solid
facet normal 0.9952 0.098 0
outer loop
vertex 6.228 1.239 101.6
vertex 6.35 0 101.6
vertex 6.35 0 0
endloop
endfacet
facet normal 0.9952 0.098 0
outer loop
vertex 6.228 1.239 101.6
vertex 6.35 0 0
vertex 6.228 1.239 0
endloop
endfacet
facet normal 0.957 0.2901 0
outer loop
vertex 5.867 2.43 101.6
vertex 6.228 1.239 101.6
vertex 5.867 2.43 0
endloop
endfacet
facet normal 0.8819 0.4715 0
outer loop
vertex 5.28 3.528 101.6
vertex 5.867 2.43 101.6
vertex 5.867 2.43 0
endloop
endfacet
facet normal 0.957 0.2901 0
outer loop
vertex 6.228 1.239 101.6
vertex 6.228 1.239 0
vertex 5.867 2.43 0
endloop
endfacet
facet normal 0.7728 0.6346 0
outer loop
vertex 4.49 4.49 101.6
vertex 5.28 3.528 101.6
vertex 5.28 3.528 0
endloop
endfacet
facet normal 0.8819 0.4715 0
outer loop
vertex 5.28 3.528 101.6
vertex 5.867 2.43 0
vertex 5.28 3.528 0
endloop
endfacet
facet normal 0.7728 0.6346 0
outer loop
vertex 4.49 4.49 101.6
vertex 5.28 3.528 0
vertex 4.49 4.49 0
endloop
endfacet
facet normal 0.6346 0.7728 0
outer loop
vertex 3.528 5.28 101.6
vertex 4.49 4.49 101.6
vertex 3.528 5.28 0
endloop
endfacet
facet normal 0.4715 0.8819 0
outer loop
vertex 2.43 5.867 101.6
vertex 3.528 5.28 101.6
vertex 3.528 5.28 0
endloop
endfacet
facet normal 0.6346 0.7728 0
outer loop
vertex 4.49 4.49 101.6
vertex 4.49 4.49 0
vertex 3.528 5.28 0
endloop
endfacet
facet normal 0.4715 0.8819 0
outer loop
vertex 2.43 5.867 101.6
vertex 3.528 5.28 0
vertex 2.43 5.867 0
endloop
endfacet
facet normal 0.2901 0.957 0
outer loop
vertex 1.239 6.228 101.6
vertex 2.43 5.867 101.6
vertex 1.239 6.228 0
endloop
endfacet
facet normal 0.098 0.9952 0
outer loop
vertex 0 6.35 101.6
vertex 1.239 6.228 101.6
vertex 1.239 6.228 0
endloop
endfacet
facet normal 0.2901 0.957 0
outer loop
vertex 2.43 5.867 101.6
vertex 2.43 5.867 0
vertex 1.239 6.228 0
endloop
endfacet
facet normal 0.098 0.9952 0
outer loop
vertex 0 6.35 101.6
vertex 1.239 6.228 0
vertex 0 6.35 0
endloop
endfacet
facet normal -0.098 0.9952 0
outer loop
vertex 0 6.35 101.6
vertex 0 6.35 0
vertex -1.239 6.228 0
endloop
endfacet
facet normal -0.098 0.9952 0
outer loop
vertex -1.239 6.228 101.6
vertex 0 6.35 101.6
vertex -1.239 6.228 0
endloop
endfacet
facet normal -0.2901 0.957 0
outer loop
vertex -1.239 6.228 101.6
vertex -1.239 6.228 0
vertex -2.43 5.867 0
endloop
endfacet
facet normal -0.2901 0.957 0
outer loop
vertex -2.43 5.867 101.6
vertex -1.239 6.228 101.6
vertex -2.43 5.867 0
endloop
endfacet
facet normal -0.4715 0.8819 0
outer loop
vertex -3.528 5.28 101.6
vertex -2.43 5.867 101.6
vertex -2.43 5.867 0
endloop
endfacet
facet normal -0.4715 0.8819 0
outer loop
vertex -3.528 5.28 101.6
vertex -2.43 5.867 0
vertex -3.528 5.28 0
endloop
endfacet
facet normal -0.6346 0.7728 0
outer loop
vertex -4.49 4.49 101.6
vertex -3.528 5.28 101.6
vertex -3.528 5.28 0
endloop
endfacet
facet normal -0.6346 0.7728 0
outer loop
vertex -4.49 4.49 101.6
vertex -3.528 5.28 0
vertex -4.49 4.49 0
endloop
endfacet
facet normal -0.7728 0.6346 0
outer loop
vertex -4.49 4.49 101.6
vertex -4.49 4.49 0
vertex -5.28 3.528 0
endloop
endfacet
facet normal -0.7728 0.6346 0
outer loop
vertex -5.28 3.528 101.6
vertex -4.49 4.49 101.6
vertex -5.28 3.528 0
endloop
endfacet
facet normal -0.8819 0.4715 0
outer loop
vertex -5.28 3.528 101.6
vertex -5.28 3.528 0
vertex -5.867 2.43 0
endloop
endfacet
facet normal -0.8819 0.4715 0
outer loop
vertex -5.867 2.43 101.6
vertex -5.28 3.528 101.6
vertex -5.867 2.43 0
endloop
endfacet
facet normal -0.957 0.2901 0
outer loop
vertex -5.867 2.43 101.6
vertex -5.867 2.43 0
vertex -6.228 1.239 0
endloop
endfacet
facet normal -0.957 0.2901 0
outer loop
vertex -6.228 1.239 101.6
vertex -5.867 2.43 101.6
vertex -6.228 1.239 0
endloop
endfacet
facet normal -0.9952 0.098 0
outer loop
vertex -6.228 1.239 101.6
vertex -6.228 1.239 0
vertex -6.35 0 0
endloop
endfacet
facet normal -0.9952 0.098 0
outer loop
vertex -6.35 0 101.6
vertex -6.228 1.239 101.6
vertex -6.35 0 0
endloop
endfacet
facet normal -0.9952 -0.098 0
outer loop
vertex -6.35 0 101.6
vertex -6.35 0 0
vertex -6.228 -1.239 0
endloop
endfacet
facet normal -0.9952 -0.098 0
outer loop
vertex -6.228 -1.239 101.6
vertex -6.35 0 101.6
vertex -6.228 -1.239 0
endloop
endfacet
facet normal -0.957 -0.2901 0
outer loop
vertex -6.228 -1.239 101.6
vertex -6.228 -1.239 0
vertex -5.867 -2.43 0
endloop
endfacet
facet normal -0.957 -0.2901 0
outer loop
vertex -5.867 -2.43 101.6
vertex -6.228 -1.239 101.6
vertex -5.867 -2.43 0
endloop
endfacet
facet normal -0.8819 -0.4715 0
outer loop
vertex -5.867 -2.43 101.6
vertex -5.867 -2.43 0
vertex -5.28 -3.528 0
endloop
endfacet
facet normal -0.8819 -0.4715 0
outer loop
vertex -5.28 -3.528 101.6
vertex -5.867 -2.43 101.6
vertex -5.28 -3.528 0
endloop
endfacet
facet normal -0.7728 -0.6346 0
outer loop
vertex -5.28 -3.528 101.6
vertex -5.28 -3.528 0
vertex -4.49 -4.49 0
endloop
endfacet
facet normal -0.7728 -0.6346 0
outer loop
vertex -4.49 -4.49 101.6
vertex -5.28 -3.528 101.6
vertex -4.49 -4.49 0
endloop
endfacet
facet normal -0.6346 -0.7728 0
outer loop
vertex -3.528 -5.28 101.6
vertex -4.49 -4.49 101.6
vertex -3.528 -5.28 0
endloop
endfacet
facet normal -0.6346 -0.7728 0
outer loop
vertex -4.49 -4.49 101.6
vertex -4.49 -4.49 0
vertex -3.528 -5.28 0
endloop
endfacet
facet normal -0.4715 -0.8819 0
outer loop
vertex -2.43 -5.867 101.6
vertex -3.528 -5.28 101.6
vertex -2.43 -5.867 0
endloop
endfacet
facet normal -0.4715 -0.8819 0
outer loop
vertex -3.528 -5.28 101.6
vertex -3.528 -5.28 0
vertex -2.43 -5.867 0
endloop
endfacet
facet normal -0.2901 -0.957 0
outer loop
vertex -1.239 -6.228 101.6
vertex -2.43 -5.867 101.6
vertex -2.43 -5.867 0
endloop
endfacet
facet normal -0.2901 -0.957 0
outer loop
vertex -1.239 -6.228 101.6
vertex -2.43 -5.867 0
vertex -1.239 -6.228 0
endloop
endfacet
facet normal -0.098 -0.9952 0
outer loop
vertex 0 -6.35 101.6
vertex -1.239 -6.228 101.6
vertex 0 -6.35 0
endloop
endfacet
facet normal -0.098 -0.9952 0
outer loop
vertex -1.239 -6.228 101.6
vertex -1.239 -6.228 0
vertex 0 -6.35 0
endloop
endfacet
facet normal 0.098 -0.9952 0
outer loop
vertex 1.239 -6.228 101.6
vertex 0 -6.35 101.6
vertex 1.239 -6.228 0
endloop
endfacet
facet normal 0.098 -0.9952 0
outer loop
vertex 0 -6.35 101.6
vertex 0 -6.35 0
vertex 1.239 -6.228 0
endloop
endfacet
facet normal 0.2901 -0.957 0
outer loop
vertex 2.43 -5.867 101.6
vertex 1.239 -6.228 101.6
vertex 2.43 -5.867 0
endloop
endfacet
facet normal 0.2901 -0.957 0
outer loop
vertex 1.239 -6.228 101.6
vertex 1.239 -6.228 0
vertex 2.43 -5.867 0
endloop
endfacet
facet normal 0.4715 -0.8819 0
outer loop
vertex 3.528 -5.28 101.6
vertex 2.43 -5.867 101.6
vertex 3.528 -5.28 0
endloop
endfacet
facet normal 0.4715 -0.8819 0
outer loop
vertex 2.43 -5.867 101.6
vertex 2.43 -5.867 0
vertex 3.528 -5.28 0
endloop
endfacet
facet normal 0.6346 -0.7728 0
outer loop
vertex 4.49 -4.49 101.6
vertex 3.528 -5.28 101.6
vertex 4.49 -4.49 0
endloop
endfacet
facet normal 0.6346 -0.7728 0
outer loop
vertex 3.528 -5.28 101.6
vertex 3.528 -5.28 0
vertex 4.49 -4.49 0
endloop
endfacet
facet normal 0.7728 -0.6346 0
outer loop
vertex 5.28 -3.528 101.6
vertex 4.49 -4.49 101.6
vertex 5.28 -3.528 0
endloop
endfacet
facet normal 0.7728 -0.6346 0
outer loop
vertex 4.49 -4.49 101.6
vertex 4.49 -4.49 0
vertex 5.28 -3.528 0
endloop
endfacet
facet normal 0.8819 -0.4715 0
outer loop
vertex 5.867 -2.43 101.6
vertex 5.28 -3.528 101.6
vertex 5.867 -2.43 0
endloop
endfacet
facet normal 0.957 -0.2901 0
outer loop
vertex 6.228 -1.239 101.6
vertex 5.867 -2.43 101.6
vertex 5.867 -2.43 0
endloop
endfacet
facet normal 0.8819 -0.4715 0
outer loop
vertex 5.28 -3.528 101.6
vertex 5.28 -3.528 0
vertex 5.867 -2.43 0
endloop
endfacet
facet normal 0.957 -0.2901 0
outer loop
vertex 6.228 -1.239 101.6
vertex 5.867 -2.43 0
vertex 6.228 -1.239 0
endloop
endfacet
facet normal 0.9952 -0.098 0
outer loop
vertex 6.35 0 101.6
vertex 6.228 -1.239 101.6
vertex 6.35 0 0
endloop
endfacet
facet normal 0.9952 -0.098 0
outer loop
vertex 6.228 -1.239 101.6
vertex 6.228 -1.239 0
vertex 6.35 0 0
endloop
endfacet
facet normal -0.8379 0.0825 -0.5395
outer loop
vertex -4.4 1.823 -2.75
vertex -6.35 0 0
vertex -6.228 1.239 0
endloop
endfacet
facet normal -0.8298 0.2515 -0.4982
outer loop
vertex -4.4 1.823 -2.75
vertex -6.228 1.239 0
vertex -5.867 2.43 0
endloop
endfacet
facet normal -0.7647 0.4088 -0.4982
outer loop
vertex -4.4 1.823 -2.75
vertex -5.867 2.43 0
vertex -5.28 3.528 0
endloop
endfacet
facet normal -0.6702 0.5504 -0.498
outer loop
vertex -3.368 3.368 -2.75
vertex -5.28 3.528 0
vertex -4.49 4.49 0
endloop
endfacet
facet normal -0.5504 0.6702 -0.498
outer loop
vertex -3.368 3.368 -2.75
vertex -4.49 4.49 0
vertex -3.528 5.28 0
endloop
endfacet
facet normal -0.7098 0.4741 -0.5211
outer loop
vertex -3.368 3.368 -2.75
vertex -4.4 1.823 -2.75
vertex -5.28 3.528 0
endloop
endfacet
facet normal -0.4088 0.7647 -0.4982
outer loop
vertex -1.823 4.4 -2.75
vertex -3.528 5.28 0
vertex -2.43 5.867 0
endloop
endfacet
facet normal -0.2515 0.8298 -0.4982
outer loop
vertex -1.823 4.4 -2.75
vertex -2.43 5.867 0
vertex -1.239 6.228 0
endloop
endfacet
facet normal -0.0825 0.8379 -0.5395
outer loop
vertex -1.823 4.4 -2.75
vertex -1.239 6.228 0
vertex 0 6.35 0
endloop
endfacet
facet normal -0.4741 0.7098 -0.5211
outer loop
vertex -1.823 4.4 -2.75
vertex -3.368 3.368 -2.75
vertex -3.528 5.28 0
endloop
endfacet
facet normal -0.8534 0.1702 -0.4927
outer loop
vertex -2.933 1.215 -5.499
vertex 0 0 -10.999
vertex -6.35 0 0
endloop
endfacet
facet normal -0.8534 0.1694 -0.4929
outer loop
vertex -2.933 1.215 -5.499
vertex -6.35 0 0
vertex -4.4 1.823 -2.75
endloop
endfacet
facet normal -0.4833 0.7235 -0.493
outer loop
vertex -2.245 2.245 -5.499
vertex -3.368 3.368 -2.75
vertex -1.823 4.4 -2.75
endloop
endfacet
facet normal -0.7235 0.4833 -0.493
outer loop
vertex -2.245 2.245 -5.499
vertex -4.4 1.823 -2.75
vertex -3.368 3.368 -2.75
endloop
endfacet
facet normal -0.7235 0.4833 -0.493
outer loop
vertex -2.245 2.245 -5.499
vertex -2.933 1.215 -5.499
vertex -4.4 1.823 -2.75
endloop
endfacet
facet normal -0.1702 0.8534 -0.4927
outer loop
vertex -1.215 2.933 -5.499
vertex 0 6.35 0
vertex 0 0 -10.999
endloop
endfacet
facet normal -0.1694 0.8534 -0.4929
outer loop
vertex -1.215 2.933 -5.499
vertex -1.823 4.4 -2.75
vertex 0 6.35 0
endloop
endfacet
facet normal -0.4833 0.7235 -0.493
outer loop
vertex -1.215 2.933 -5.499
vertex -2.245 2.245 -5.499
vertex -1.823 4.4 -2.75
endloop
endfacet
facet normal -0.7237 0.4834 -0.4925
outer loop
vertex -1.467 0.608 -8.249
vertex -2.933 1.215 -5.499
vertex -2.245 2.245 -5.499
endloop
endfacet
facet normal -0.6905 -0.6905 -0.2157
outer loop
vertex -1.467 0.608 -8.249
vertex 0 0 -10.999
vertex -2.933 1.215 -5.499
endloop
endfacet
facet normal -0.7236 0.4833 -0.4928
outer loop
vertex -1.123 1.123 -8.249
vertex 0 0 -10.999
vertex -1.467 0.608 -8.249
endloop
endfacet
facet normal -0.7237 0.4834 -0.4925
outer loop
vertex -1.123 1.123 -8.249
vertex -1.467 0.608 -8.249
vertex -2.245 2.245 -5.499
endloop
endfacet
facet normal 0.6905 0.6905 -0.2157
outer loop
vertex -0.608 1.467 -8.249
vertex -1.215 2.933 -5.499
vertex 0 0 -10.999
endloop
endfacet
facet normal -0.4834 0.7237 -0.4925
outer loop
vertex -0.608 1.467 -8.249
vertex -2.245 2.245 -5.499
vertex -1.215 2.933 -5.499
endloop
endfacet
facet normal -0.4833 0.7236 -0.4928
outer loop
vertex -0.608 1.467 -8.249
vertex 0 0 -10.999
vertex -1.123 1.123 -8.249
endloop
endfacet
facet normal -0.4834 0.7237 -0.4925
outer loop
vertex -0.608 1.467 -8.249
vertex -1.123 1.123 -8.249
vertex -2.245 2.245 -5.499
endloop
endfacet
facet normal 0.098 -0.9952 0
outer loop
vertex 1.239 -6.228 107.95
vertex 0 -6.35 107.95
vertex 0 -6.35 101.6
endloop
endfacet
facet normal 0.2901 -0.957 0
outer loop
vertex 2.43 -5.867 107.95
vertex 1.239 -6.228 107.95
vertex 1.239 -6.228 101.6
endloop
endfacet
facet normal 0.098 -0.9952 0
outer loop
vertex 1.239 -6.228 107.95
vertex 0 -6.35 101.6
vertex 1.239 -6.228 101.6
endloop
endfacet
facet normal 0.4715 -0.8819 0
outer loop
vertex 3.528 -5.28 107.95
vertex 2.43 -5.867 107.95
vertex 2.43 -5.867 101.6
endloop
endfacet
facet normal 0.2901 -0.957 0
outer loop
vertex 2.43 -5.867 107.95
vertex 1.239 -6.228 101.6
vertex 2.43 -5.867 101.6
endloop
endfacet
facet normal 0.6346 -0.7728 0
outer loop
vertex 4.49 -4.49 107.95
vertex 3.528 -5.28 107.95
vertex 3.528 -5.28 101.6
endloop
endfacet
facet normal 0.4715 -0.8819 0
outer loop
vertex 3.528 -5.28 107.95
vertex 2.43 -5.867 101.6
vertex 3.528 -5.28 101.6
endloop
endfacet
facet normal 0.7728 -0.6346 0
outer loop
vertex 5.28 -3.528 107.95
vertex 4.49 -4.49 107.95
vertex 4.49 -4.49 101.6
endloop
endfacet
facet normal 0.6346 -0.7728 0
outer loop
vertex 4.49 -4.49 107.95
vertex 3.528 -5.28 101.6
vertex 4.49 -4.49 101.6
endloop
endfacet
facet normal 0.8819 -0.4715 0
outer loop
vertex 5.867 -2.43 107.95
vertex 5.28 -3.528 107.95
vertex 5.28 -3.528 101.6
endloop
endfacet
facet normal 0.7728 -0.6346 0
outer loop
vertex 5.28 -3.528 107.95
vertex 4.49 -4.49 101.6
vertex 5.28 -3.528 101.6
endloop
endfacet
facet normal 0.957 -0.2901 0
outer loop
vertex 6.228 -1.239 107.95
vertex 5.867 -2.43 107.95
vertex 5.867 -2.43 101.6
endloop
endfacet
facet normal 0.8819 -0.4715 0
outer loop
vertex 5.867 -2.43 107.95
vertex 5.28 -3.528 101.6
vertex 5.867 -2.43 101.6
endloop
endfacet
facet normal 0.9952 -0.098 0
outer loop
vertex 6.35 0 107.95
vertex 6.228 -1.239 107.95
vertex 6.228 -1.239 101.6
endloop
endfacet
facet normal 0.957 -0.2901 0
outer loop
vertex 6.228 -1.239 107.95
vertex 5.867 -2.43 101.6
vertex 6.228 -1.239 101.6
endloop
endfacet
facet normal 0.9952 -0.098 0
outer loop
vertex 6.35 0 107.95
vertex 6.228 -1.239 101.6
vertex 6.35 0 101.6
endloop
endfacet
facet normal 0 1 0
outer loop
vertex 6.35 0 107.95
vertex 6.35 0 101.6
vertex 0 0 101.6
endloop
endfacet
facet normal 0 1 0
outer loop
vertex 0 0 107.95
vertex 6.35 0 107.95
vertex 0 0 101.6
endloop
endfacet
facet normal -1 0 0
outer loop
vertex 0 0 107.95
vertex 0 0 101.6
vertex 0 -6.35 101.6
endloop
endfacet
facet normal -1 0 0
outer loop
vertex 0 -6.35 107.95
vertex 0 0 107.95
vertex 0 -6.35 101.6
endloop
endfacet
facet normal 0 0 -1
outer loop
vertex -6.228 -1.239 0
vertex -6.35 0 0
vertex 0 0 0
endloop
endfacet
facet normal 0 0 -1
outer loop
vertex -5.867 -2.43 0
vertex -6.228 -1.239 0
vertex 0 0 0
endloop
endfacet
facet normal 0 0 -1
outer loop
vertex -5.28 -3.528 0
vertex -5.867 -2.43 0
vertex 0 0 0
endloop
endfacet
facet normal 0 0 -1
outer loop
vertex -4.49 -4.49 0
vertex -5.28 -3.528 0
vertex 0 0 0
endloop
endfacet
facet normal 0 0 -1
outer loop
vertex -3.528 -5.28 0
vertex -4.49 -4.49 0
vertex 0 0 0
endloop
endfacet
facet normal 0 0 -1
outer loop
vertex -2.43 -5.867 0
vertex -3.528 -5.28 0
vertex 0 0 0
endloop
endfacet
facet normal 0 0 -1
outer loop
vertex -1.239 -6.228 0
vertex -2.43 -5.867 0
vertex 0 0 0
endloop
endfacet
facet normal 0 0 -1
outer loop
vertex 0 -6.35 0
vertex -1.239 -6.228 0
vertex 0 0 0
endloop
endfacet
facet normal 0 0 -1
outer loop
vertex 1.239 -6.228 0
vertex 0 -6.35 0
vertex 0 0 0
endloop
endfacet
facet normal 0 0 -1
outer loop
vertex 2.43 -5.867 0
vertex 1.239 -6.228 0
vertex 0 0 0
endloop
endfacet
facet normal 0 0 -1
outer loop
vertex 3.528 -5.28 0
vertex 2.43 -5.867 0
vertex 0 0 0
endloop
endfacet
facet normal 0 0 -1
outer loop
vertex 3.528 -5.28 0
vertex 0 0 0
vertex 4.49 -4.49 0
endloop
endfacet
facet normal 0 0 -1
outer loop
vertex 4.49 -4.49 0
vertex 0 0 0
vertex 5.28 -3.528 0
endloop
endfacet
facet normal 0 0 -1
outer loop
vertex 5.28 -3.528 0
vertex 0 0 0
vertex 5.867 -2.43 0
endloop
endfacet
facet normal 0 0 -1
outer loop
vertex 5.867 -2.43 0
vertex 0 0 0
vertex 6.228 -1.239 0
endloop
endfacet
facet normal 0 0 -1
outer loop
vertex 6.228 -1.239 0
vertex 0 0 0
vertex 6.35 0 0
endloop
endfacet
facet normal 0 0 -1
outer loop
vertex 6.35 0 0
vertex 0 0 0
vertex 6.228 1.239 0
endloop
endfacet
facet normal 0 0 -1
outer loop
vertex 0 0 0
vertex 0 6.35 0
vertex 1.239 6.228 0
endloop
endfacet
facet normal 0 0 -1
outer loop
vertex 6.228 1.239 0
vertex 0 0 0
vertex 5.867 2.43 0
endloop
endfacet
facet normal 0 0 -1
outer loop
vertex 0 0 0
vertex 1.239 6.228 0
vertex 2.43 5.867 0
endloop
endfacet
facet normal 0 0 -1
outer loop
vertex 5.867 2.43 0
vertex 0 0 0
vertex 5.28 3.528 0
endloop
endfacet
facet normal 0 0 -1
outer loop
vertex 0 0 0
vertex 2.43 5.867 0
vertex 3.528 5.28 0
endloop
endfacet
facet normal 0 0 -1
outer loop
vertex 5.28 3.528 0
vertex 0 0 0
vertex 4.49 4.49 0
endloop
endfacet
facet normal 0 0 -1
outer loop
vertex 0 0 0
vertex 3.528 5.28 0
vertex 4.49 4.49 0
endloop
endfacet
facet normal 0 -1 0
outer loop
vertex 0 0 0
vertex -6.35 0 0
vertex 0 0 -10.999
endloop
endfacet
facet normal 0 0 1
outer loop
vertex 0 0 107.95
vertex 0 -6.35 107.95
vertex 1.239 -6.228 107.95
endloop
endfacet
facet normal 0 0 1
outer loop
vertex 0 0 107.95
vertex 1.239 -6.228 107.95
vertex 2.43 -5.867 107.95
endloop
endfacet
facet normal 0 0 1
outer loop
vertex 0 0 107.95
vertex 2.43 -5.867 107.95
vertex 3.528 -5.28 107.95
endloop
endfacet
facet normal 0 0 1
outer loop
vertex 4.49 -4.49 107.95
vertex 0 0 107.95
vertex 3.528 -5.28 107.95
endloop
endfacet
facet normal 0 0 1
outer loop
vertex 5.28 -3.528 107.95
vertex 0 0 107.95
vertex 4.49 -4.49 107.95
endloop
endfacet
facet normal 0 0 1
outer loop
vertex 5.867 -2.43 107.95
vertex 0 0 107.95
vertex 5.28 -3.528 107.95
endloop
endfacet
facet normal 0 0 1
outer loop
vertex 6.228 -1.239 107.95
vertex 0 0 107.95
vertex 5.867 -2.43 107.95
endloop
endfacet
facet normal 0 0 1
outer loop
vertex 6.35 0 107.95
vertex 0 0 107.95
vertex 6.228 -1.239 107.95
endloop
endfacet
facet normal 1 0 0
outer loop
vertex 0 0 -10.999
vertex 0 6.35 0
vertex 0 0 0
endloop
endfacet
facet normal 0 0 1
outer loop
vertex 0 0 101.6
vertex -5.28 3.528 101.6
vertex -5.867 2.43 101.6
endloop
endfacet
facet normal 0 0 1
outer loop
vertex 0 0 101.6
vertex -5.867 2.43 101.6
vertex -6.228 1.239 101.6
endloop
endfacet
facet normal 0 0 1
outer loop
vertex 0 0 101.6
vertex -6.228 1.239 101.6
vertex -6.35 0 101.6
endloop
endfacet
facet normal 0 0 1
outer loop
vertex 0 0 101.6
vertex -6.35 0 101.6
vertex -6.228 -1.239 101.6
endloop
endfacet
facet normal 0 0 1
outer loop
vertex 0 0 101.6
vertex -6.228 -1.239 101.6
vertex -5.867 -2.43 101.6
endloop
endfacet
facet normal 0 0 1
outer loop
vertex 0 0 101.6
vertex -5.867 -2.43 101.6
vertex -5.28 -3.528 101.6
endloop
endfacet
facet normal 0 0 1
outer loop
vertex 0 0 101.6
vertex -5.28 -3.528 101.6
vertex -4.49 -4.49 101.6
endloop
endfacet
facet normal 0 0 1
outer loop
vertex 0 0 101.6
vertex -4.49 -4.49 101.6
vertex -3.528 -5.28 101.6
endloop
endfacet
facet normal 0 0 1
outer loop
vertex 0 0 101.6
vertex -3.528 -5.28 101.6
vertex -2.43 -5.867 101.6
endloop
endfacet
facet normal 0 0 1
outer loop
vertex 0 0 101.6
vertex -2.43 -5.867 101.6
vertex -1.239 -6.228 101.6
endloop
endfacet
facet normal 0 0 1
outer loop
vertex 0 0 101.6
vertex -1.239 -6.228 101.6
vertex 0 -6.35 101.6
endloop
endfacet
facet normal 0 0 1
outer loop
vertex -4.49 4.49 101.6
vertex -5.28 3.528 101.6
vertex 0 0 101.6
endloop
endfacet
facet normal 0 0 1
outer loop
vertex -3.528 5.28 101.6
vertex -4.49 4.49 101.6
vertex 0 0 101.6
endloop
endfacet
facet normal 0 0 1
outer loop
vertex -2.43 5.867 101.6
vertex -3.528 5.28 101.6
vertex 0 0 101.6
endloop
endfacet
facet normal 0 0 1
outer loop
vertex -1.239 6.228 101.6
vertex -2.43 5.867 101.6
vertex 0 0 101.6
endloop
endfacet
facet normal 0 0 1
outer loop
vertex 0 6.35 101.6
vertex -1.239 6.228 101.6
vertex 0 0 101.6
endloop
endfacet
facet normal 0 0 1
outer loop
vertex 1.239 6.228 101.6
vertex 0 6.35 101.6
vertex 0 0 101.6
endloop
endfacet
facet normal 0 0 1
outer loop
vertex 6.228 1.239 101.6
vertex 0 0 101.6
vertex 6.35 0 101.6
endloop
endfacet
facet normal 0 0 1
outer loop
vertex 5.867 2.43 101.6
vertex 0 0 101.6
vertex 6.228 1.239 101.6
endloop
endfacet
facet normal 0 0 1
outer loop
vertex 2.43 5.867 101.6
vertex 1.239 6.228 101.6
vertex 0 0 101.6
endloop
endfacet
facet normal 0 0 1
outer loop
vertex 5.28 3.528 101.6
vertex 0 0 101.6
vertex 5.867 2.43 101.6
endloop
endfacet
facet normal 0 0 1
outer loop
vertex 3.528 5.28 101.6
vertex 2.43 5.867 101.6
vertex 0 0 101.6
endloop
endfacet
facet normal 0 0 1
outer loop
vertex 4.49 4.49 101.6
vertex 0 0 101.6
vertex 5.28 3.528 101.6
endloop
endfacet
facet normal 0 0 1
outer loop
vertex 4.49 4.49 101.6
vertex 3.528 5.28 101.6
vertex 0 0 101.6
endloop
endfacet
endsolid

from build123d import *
from build123d import SkipClean  # not in build123d's __all__

# Parameters (mm, degrees)
F1_ANGLE = 90
F2_R     = 6.35
F3_DEPTH = 101.6
F5_DEPTH = 6.35


with BuildPart() as f1:
    # F0 (on Front) → F1 (revolve)
    with BuildSketch(Plane.XZ):
        Polygon((0, -10.9985226281), (0, 0), (-6.35, 0), align=None)
    revolve(axis=Axis((0, 0, -5.499261314), (0, 0, -1)), revolution_arc=F1_ANGLE)

    # F2 (on face) → F3 (join)
    with BuildSketch(Plane.XY):
        Circle(F2_R)
    extrude(amount=F3_DEPTH)

    # F4 (on face) → F5 (join)
    with BuildSketch(Plane.XY.offset(101.6)):
        with BuildLine():
            ThreePointArc((0, -6.35), (4.4901280605, -4.4901280605), (6.35, 0))
            Line((6.35, 0), (0, 0))
            Line((0, 0), (0, -6.35))
        make_face()
    with SkipClean():  # cleaning this boolean's faces spoils the solid; the shape is the same uncleaned
        extrude(amount=F5_DEPTH)


solid = f1.part
